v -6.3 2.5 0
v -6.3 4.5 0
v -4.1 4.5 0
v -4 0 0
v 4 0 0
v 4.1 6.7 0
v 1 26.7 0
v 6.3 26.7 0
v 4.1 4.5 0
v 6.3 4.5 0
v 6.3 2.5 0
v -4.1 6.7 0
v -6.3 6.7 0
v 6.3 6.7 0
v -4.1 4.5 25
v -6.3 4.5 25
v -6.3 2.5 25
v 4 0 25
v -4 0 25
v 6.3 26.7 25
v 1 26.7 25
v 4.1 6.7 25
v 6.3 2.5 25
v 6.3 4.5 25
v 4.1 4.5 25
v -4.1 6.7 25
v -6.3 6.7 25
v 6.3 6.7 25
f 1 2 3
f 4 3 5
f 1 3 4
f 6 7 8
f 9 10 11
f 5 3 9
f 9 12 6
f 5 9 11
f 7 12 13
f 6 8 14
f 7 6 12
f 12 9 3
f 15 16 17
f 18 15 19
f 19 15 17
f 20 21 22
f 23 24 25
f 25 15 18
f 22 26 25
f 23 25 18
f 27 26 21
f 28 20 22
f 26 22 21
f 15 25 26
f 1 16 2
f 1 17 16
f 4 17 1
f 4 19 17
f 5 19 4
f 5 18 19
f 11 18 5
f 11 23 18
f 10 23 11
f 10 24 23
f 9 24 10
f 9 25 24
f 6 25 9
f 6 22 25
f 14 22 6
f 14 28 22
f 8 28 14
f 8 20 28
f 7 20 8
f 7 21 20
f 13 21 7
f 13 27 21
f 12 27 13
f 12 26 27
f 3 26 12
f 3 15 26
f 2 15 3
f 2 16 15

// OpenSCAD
hw1 = 4;
hw2 = 6.3;
hw3 = 4.1;
hw4 = 6.3;

h1 = 2.5;
h2 = 2.0;
h3 = 2.2;
h4 = 20;

linear_extrude(height = 25)
polygon(
[
  [-hw1, 0], [hw1, 0],
  [-hw2, h1], [hw2, h1],
  [-hw2, h1 + h2], [hw2, h1 + h2],

  [-hw3, h1 + h2], [hw3, h1 + h2],
  [-hw3, h1 + h2 + h3], [hw3, h1 + h2 + h3],

  [-hw4, h1 + h2 + h3], [hw4, h1 + h2 + h3],  
  [1   , h1 + h2 + h3 + h4], [hw4, h1 + h2 + h3 + h4],
],
[
  [0, 1, 3, 5, 4, 2],  
  [6, 7, 9, 8],
  [10, 11, 13, 12],
]
);
